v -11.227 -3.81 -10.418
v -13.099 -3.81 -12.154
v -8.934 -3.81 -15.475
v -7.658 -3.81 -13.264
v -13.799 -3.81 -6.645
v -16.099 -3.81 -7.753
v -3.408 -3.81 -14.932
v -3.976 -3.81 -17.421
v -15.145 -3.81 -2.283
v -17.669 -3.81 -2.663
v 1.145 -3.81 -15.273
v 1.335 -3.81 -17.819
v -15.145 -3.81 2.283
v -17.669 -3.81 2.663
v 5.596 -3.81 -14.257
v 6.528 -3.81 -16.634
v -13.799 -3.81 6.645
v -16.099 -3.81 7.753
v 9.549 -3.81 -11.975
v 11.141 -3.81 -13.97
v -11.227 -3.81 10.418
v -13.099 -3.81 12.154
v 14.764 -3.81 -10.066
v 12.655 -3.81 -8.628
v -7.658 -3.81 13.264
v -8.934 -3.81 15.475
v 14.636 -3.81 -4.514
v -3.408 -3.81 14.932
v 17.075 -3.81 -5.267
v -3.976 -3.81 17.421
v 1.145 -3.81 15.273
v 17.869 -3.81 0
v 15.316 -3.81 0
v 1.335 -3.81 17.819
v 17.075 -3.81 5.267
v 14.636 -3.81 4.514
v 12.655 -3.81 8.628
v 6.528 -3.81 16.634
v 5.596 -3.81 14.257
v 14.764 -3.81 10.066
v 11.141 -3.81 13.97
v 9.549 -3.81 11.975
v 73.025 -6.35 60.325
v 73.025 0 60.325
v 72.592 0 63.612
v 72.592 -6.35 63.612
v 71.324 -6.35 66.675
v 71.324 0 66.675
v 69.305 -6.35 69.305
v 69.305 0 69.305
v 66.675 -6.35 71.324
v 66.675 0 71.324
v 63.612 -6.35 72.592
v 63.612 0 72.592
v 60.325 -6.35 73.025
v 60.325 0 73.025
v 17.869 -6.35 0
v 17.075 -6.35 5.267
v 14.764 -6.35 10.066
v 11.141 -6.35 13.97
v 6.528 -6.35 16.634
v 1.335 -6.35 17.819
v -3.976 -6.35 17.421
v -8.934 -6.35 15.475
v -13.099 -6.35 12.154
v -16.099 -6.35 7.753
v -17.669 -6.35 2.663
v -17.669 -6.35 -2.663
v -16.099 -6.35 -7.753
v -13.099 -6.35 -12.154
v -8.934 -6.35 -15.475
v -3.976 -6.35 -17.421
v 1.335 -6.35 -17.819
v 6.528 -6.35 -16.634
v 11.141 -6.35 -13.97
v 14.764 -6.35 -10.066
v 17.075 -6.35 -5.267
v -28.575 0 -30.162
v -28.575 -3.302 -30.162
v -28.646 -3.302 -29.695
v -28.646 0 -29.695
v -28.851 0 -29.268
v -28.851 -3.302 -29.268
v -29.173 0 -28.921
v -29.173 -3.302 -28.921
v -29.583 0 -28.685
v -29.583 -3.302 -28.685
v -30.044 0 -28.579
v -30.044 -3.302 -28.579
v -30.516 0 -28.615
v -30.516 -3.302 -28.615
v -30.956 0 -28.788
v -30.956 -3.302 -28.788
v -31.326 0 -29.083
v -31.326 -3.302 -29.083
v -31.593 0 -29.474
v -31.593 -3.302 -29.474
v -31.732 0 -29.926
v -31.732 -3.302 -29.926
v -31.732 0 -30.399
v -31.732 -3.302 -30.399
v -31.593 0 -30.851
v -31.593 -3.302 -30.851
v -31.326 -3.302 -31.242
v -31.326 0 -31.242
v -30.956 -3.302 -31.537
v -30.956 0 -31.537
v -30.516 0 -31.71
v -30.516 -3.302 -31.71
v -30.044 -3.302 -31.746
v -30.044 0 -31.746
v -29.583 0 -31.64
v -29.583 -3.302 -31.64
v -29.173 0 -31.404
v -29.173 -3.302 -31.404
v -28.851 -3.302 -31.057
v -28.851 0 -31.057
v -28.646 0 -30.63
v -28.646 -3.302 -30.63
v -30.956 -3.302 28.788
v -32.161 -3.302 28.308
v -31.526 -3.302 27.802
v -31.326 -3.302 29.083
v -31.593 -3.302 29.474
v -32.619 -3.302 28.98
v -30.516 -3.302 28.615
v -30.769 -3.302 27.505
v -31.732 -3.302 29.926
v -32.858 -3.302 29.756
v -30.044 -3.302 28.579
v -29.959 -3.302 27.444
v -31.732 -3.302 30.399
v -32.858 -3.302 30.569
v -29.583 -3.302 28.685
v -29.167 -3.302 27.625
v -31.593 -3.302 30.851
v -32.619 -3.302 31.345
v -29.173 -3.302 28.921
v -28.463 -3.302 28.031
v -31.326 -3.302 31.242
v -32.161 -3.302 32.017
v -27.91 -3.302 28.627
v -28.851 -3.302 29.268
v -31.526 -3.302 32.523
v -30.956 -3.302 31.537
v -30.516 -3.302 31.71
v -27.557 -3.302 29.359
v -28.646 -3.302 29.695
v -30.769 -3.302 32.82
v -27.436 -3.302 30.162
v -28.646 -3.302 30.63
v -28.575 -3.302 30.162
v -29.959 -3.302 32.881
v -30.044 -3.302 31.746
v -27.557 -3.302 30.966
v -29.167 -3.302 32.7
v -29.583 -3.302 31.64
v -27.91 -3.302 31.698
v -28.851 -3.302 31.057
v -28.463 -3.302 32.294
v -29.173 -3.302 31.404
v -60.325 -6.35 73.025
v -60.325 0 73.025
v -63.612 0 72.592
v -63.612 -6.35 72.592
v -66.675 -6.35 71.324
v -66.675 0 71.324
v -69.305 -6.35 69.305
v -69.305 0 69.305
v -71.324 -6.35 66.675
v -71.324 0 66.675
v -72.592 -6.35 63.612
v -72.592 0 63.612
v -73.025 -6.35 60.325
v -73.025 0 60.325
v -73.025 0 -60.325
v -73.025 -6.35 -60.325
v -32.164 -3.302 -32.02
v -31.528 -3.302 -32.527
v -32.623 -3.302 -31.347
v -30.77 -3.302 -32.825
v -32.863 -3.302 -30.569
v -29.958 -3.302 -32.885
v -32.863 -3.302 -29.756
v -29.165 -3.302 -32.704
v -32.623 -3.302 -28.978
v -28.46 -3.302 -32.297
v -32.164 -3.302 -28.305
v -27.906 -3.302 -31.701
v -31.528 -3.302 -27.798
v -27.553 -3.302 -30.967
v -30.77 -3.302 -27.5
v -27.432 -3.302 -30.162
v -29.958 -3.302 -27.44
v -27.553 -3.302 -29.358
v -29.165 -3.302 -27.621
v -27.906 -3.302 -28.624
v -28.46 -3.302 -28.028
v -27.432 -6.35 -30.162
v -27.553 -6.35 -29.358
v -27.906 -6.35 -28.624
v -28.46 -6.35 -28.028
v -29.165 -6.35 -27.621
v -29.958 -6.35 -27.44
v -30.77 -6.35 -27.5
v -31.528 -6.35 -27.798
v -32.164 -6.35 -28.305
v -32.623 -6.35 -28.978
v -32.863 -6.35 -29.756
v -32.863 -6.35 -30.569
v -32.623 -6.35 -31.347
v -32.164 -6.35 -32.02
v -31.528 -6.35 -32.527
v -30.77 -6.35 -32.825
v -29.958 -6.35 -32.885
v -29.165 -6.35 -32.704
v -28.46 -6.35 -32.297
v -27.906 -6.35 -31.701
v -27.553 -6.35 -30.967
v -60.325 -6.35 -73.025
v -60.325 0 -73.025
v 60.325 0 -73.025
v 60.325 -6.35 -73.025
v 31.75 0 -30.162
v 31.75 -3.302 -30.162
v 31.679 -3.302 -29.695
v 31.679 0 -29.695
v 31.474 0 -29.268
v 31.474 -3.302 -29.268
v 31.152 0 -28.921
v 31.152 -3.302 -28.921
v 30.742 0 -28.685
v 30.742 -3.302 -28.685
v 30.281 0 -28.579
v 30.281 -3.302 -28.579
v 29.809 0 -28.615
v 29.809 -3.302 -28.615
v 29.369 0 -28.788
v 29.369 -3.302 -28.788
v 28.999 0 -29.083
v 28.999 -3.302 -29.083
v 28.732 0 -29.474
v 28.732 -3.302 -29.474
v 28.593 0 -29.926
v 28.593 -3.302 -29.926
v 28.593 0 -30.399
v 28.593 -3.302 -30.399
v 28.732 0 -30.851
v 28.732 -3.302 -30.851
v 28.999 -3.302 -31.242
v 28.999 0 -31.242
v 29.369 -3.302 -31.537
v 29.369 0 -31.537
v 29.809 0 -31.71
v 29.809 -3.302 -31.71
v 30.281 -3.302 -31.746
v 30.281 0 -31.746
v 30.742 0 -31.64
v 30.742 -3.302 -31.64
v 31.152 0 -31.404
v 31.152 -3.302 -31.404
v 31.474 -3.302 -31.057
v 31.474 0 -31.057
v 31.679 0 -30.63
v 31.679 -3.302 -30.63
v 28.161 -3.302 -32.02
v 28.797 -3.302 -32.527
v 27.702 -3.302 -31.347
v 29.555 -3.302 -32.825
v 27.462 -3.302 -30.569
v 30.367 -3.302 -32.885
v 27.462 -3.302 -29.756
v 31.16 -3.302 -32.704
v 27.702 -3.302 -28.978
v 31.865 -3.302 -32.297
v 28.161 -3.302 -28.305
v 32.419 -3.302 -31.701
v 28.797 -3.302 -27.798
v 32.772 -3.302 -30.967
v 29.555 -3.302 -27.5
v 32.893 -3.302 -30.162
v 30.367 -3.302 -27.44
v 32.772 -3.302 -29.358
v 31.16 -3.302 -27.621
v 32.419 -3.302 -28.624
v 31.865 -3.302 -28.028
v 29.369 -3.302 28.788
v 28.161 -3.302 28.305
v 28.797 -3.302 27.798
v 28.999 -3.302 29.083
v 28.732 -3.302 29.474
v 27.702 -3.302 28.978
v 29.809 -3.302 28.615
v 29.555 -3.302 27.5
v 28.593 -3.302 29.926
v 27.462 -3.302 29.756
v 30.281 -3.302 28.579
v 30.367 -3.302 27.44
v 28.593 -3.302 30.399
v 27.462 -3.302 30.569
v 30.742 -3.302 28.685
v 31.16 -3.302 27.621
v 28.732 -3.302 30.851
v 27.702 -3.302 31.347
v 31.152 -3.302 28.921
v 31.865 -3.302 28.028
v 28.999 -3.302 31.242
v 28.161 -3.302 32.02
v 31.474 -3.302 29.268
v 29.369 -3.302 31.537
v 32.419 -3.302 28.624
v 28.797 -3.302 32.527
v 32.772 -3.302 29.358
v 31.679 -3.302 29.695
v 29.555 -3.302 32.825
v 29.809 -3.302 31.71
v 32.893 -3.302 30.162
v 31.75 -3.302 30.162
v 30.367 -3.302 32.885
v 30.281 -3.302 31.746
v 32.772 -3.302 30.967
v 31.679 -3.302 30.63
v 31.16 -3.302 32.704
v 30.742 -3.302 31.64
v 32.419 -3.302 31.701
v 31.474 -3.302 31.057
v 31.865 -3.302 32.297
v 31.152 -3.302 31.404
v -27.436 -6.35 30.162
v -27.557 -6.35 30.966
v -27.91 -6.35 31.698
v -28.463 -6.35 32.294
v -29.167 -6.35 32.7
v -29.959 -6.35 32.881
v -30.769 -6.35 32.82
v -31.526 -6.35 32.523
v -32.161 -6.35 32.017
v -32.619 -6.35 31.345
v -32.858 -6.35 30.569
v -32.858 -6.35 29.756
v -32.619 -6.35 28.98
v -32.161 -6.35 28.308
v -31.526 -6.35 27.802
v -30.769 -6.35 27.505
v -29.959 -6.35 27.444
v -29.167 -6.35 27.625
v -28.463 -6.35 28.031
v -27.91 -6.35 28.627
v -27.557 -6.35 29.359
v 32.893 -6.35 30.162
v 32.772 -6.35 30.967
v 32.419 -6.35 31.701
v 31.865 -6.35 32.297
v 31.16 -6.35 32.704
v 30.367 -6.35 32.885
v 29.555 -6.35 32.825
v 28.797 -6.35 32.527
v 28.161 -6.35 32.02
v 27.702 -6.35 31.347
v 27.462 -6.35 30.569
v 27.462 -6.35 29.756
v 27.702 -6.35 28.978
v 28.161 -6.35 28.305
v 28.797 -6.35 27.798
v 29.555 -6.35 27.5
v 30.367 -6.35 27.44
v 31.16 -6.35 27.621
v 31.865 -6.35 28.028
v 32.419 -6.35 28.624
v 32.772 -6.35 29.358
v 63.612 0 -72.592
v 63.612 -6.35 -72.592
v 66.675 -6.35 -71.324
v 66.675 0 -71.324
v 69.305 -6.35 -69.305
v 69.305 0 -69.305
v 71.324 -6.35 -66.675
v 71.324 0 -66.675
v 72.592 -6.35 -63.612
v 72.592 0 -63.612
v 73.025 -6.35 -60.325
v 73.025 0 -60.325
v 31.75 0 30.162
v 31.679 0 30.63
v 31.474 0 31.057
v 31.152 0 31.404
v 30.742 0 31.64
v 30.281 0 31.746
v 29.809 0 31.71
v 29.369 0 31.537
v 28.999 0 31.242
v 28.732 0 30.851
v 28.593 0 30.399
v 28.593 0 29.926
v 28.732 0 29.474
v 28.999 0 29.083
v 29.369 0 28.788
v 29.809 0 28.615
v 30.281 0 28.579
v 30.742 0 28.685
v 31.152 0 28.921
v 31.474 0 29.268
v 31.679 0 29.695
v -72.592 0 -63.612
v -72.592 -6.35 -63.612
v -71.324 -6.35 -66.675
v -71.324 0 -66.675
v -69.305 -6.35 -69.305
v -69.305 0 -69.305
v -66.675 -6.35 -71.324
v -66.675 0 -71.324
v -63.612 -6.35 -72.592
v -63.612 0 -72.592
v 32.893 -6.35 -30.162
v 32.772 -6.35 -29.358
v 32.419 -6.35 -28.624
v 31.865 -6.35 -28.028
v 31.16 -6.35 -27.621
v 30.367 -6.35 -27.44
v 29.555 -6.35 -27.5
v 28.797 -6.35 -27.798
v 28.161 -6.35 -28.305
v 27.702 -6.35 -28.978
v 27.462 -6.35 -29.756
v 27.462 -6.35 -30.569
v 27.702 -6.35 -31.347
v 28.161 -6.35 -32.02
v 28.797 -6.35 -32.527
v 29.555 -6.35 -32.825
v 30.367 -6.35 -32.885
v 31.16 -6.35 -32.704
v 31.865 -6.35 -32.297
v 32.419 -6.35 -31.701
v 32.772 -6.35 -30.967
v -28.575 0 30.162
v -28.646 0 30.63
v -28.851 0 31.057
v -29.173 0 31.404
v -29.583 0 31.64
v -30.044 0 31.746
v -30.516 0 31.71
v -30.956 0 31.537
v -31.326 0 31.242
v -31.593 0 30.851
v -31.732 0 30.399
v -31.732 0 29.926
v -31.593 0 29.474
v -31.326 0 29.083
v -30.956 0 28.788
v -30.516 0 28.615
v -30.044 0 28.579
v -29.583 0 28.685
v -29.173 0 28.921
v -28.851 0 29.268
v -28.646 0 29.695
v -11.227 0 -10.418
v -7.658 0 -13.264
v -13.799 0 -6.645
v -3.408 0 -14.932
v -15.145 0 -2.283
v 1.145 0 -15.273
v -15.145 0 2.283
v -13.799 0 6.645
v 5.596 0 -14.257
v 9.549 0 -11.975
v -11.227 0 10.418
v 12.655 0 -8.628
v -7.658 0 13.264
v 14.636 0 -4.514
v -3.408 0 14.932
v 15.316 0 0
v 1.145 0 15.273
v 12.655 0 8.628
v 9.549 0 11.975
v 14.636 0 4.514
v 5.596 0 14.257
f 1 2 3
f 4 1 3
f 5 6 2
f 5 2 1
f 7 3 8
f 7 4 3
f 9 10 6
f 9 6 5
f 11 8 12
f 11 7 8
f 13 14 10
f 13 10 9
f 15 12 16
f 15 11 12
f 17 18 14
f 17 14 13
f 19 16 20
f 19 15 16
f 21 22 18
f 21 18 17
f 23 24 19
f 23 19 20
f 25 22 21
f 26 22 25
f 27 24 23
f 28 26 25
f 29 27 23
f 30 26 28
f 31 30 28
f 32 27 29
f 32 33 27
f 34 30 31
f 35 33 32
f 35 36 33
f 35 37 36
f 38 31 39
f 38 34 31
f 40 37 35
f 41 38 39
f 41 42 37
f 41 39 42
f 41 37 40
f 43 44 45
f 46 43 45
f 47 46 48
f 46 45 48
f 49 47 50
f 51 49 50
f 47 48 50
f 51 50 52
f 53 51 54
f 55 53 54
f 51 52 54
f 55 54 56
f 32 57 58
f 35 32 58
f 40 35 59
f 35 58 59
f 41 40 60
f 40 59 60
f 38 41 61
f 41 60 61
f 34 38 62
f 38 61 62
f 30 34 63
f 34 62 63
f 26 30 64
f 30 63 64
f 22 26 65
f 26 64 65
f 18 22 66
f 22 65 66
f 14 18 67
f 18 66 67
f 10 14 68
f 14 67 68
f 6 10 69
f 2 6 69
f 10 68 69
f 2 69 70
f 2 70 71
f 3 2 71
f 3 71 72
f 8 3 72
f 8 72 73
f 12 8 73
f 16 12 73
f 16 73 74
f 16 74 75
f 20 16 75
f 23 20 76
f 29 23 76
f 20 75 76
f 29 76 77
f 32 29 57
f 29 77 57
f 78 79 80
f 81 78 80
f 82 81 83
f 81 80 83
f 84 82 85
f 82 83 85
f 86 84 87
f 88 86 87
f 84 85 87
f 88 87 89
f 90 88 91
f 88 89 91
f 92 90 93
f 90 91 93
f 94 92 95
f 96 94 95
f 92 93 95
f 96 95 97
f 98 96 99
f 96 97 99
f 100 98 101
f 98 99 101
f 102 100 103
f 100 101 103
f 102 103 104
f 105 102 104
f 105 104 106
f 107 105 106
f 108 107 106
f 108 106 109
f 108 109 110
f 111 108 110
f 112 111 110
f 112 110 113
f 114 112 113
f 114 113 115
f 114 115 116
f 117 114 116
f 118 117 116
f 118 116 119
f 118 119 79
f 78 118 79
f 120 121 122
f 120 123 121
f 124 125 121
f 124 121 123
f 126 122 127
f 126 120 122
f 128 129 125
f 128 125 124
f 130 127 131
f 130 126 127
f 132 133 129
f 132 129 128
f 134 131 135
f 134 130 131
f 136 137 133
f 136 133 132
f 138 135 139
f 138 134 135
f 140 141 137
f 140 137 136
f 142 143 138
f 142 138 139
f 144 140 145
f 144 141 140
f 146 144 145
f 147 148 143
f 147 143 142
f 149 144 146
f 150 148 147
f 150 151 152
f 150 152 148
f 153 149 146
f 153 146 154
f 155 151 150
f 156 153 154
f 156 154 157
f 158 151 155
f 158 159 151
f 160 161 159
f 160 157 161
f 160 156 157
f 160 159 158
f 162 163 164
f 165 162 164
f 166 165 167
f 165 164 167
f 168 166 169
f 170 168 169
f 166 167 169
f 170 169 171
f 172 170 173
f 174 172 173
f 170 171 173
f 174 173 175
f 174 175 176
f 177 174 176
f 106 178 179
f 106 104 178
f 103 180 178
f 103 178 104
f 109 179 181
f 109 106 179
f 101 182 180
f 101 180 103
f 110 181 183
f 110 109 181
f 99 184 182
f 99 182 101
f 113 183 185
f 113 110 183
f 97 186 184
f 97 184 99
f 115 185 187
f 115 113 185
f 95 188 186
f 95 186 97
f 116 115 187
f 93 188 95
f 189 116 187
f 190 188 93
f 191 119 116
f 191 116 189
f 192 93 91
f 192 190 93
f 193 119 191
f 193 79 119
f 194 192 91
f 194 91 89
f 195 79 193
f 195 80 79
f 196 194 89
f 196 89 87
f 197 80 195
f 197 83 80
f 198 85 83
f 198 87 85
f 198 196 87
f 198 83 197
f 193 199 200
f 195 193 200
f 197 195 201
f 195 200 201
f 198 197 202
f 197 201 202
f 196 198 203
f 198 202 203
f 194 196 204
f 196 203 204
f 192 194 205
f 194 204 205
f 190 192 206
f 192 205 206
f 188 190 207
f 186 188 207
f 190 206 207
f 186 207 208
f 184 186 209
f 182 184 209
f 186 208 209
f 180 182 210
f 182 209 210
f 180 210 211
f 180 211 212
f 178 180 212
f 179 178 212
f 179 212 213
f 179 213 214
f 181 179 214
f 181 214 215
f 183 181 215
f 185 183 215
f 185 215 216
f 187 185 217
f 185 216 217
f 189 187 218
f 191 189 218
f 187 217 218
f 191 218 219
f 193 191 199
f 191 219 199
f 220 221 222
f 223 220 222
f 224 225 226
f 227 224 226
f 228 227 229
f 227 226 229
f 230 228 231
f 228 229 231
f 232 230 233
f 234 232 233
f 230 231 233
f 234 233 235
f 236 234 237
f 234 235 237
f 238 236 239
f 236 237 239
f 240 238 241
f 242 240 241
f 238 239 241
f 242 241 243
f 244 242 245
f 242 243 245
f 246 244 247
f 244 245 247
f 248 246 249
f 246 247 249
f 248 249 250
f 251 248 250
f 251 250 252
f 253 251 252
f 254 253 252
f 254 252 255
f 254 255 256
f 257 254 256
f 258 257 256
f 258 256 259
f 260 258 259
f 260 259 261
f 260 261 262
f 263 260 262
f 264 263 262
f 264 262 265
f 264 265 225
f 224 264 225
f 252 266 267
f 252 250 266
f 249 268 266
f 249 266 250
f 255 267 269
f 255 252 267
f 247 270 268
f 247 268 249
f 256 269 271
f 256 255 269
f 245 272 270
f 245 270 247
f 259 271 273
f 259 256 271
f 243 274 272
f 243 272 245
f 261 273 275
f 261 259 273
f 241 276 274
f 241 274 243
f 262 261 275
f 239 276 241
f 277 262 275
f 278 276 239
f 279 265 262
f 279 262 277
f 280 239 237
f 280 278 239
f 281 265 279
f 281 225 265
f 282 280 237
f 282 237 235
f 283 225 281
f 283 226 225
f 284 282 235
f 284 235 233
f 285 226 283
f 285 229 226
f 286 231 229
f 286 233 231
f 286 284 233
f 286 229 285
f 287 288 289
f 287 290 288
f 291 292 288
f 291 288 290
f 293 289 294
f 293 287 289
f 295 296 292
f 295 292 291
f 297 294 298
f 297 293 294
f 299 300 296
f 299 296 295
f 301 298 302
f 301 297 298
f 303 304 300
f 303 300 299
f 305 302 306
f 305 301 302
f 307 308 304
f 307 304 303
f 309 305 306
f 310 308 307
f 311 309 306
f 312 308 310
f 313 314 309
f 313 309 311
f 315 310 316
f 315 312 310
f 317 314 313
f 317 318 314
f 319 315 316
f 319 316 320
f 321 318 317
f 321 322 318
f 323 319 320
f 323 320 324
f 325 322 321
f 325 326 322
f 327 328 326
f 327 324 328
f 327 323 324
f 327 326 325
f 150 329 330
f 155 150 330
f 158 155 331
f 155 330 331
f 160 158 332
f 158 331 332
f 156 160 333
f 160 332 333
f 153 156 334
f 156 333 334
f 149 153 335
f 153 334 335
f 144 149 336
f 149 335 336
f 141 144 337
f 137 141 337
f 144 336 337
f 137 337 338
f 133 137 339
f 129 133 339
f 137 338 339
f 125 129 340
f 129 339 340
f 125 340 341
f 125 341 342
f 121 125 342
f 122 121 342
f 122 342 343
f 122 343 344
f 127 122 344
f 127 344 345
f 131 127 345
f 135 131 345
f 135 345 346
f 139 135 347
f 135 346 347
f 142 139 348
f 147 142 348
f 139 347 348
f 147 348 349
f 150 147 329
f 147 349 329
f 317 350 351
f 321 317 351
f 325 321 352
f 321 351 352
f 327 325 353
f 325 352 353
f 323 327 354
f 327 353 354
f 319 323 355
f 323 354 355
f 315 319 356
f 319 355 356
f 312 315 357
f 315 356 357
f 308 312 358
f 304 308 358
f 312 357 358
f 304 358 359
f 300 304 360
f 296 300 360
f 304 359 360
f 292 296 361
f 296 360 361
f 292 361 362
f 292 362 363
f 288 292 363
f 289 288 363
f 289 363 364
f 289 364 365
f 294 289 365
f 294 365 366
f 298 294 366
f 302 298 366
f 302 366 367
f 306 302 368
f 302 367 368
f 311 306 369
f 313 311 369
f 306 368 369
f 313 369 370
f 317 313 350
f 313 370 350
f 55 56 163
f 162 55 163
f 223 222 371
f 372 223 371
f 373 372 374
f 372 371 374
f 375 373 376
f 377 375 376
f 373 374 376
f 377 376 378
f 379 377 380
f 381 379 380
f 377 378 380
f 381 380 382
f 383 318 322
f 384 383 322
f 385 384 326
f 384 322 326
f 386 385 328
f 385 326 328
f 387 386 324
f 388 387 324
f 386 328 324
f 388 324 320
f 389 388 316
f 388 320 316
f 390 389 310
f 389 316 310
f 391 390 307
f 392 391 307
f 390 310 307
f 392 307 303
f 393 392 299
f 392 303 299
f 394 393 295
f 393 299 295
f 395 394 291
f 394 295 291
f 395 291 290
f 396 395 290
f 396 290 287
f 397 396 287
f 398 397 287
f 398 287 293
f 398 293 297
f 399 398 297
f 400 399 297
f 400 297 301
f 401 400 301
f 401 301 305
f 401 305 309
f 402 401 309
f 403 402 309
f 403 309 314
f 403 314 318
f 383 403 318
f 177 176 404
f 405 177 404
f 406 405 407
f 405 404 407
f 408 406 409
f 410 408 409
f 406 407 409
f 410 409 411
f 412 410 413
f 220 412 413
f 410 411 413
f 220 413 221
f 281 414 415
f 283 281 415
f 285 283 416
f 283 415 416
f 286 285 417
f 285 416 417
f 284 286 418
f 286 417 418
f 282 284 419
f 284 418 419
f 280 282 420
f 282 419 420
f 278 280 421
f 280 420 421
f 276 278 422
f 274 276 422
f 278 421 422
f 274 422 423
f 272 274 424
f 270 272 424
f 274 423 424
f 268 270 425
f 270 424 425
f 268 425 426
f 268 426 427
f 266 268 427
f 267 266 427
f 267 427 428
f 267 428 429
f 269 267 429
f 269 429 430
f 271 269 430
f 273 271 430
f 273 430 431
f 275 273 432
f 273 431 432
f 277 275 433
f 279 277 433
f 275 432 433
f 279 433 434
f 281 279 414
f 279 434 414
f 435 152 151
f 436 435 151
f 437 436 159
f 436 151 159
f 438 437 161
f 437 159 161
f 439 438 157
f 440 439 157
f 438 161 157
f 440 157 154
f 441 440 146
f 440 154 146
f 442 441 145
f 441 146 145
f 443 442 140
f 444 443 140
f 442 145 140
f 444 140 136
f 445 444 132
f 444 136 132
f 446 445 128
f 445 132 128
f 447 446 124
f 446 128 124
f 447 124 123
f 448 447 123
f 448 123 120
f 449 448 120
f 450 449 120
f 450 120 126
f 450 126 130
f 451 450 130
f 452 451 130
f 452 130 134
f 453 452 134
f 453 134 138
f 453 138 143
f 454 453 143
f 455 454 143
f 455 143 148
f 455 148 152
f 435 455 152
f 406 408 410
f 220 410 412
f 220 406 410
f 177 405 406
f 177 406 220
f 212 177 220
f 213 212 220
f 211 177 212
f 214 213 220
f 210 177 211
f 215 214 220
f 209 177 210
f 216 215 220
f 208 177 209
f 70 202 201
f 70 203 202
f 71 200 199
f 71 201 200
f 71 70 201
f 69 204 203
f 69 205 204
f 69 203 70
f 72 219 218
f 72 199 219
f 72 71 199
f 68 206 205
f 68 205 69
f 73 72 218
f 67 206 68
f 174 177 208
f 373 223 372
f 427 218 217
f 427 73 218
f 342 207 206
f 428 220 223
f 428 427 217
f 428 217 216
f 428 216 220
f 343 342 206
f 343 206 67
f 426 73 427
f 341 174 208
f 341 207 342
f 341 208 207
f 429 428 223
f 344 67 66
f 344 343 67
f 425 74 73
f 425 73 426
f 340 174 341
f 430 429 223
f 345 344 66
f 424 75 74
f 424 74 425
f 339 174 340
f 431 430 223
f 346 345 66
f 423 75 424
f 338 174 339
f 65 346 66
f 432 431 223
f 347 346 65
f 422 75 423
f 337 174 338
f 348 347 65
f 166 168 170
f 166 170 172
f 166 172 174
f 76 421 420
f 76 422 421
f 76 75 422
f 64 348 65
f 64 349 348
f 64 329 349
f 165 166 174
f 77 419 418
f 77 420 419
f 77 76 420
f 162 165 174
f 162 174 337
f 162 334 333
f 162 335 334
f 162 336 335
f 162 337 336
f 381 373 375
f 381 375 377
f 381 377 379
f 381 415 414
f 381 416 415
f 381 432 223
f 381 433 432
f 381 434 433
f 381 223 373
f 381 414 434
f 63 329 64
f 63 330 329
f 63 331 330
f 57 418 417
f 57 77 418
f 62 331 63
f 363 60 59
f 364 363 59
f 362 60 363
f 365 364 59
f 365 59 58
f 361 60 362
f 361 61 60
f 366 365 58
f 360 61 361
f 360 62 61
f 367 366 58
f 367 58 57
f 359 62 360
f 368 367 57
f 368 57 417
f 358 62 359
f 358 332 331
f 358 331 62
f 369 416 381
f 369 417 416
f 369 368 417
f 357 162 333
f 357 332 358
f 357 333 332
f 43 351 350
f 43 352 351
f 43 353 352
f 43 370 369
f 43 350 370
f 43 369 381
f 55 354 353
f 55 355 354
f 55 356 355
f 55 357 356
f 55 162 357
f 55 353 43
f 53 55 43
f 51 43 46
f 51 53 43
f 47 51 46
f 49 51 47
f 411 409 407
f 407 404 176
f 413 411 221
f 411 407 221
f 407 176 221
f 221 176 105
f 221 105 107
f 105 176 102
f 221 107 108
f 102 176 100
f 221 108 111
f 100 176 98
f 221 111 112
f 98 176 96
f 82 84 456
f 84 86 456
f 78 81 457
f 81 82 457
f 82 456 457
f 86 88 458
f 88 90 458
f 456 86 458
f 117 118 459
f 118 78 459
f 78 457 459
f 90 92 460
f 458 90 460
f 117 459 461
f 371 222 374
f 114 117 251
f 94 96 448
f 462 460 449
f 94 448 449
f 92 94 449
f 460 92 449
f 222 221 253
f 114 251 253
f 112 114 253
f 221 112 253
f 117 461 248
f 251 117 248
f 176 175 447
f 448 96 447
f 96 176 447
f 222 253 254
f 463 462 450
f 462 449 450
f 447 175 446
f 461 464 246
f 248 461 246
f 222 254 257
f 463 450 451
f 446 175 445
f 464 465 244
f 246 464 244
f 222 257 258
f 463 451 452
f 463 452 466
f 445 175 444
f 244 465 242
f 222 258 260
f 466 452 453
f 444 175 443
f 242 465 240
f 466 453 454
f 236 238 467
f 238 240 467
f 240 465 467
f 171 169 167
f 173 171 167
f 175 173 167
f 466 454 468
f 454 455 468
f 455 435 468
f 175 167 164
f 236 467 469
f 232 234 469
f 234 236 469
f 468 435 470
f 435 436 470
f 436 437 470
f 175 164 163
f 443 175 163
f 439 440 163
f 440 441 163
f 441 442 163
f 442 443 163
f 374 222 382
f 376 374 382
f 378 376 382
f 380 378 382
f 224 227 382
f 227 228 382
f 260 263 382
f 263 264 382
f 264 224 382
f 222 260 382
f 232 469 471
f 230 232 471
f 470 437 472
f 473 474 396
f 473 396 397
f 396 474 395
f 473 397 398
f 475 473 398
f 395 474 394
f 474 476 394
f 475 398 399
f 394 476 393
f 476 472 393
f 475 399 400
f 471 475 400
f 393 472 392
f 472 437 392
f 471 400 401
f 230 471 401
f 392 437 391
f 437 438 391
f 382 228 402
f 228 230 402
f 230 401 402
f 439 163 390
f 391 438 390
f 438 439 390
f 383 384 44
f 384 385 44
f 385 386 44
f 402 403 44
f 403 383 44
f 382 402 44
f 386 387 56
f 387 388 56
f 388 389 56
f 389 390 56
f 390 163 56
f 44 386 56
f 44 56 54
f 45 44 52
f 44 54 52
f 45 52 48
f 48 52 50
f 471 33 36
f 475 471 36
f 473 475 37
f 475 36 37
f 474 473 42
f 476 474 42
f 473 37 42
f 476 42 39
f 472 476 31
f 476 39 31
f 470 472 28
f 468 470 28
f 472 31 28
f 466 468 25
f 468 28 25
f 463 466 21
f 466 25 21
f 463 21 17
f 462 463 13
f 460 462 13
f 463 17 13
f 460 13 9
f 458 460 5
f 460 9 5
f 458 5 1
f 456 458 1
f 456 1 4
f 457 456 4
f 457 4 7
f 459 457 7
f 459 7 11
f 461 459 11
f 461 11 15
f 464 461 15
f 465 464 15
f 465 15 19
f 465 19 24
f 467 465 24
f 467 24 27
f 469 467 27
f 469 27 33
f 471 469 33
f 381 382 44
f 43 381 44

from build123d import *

# Parameters (mm, degrees)
F1_DEPTH = 6.35
F2_R     = 15.316097
F3_DEPTH = 6.35
F2_R_2   = 17.868779
F4_DEPTH = 2.54
F2_R_3   = 1.5875
F5_DEPTH = 6.35
F2_R_4   = 2.7305
F2_R_5   = 2.726201
F6_DEPTH = 3.048


with BuildPart() as f1:
    # F0 (on Front) → F1 (new body)
    with BuildSketch(Plane.XZ):
        with BuildLine():
            ThreePointArc((73.025, 60.325), (69.305256, 69.305256), (60.325, 73.025))
            Line((60.325, 73.025), (-60.325, 73.025))
            ThreePointArc((-60.325, 73.025), (-69.305256, 69.305256), (-73.025, 60.325))
            Line((-73.025, 60.325), (-73.025, -60.325))
            ThreePointArc((-73.025, -60.325), (-69.305256, -69.305256), (-60.325, -73.025))
            Line((-60.325, -73.025), (60.325, -73.025))
            ThreePointArc((60.325, -73.025), (69.305256, -69.305256), (73.025, -60.325))
            Line((73.025, -60.325), (73.025, 60.325))
        make_face()
    extrude(amount=F1_DEPTH)

    # F2 (on face) → F3 (cut)
    with BuildSketch(Plane.XZ.offset(6.35)):
        Circle(F2_R)
    extrude(amount=-F3_DEPTH, mode=Mode.SUBTRACT)

    # F2 (on face) → F4 (cut)
    with BuildSketch(Plane.XZ.offset(6.35)):
        Circle(F2_R_2)
        Circle(F2_R, mode=Mode.SUBTRACT)
    extrude(amount=-F4_DEPTH, mode=Mode.SUBTRACT)

    # F2 (on face) → F5 (cut)
    with BuildSketch(Plane.XZ.offset(6.35)):
        with Locations((30.1625, 30.1625)):
            Circle(F2_R_3)
        with Locations((30.1625, -30.1625)):
            Circle(F2_R_3)
        with Locations((-30.1625, 30.1625)):
            Circle(F2_R_3)
        with Locations((-30.1625, -30.1625)):
            Circle(F2_R_3)
    extrude(amount=-F5_DEPTH, mode=Mode.SUBTRACT)

    # F2 (on face) → F6 (cut)
    with BuildSketch(Plane.XZ.offset(6.35)):
        with Locations((-30.1625, -30.1625)):
            Circle(F2_R_4)
        with Locations((-30.1625, -30.1625)):
            Circle(F2_R_3, mode=Mode.SUBTRACT)
        with Locations((30.1625, -30.1625)):
            Circle(F2_R_4)
        with Locations((30.1625, -30.1625)):
            Circle(F2_R_3, mode=Mode.SUBTRACT)
        with Locations((30.1625, 30.1625)):
            Circle(F2_R_4)
        with Locations((30.1625, 30.1625)):
            Circle(F2_R_3, mode=Mode.SUBTRACT)
        with Locations((-30.1625, 30.1625)):
            Circle(F2_R_5)
        with Locations((-30.1625, 30.1625)):
            Circle(F2_R_3, mode=Mode.SUBTRACT)
    extrude(amount=-F6_DEPTH, mode=Mode.SUBTRACT)


solid = f1.part
